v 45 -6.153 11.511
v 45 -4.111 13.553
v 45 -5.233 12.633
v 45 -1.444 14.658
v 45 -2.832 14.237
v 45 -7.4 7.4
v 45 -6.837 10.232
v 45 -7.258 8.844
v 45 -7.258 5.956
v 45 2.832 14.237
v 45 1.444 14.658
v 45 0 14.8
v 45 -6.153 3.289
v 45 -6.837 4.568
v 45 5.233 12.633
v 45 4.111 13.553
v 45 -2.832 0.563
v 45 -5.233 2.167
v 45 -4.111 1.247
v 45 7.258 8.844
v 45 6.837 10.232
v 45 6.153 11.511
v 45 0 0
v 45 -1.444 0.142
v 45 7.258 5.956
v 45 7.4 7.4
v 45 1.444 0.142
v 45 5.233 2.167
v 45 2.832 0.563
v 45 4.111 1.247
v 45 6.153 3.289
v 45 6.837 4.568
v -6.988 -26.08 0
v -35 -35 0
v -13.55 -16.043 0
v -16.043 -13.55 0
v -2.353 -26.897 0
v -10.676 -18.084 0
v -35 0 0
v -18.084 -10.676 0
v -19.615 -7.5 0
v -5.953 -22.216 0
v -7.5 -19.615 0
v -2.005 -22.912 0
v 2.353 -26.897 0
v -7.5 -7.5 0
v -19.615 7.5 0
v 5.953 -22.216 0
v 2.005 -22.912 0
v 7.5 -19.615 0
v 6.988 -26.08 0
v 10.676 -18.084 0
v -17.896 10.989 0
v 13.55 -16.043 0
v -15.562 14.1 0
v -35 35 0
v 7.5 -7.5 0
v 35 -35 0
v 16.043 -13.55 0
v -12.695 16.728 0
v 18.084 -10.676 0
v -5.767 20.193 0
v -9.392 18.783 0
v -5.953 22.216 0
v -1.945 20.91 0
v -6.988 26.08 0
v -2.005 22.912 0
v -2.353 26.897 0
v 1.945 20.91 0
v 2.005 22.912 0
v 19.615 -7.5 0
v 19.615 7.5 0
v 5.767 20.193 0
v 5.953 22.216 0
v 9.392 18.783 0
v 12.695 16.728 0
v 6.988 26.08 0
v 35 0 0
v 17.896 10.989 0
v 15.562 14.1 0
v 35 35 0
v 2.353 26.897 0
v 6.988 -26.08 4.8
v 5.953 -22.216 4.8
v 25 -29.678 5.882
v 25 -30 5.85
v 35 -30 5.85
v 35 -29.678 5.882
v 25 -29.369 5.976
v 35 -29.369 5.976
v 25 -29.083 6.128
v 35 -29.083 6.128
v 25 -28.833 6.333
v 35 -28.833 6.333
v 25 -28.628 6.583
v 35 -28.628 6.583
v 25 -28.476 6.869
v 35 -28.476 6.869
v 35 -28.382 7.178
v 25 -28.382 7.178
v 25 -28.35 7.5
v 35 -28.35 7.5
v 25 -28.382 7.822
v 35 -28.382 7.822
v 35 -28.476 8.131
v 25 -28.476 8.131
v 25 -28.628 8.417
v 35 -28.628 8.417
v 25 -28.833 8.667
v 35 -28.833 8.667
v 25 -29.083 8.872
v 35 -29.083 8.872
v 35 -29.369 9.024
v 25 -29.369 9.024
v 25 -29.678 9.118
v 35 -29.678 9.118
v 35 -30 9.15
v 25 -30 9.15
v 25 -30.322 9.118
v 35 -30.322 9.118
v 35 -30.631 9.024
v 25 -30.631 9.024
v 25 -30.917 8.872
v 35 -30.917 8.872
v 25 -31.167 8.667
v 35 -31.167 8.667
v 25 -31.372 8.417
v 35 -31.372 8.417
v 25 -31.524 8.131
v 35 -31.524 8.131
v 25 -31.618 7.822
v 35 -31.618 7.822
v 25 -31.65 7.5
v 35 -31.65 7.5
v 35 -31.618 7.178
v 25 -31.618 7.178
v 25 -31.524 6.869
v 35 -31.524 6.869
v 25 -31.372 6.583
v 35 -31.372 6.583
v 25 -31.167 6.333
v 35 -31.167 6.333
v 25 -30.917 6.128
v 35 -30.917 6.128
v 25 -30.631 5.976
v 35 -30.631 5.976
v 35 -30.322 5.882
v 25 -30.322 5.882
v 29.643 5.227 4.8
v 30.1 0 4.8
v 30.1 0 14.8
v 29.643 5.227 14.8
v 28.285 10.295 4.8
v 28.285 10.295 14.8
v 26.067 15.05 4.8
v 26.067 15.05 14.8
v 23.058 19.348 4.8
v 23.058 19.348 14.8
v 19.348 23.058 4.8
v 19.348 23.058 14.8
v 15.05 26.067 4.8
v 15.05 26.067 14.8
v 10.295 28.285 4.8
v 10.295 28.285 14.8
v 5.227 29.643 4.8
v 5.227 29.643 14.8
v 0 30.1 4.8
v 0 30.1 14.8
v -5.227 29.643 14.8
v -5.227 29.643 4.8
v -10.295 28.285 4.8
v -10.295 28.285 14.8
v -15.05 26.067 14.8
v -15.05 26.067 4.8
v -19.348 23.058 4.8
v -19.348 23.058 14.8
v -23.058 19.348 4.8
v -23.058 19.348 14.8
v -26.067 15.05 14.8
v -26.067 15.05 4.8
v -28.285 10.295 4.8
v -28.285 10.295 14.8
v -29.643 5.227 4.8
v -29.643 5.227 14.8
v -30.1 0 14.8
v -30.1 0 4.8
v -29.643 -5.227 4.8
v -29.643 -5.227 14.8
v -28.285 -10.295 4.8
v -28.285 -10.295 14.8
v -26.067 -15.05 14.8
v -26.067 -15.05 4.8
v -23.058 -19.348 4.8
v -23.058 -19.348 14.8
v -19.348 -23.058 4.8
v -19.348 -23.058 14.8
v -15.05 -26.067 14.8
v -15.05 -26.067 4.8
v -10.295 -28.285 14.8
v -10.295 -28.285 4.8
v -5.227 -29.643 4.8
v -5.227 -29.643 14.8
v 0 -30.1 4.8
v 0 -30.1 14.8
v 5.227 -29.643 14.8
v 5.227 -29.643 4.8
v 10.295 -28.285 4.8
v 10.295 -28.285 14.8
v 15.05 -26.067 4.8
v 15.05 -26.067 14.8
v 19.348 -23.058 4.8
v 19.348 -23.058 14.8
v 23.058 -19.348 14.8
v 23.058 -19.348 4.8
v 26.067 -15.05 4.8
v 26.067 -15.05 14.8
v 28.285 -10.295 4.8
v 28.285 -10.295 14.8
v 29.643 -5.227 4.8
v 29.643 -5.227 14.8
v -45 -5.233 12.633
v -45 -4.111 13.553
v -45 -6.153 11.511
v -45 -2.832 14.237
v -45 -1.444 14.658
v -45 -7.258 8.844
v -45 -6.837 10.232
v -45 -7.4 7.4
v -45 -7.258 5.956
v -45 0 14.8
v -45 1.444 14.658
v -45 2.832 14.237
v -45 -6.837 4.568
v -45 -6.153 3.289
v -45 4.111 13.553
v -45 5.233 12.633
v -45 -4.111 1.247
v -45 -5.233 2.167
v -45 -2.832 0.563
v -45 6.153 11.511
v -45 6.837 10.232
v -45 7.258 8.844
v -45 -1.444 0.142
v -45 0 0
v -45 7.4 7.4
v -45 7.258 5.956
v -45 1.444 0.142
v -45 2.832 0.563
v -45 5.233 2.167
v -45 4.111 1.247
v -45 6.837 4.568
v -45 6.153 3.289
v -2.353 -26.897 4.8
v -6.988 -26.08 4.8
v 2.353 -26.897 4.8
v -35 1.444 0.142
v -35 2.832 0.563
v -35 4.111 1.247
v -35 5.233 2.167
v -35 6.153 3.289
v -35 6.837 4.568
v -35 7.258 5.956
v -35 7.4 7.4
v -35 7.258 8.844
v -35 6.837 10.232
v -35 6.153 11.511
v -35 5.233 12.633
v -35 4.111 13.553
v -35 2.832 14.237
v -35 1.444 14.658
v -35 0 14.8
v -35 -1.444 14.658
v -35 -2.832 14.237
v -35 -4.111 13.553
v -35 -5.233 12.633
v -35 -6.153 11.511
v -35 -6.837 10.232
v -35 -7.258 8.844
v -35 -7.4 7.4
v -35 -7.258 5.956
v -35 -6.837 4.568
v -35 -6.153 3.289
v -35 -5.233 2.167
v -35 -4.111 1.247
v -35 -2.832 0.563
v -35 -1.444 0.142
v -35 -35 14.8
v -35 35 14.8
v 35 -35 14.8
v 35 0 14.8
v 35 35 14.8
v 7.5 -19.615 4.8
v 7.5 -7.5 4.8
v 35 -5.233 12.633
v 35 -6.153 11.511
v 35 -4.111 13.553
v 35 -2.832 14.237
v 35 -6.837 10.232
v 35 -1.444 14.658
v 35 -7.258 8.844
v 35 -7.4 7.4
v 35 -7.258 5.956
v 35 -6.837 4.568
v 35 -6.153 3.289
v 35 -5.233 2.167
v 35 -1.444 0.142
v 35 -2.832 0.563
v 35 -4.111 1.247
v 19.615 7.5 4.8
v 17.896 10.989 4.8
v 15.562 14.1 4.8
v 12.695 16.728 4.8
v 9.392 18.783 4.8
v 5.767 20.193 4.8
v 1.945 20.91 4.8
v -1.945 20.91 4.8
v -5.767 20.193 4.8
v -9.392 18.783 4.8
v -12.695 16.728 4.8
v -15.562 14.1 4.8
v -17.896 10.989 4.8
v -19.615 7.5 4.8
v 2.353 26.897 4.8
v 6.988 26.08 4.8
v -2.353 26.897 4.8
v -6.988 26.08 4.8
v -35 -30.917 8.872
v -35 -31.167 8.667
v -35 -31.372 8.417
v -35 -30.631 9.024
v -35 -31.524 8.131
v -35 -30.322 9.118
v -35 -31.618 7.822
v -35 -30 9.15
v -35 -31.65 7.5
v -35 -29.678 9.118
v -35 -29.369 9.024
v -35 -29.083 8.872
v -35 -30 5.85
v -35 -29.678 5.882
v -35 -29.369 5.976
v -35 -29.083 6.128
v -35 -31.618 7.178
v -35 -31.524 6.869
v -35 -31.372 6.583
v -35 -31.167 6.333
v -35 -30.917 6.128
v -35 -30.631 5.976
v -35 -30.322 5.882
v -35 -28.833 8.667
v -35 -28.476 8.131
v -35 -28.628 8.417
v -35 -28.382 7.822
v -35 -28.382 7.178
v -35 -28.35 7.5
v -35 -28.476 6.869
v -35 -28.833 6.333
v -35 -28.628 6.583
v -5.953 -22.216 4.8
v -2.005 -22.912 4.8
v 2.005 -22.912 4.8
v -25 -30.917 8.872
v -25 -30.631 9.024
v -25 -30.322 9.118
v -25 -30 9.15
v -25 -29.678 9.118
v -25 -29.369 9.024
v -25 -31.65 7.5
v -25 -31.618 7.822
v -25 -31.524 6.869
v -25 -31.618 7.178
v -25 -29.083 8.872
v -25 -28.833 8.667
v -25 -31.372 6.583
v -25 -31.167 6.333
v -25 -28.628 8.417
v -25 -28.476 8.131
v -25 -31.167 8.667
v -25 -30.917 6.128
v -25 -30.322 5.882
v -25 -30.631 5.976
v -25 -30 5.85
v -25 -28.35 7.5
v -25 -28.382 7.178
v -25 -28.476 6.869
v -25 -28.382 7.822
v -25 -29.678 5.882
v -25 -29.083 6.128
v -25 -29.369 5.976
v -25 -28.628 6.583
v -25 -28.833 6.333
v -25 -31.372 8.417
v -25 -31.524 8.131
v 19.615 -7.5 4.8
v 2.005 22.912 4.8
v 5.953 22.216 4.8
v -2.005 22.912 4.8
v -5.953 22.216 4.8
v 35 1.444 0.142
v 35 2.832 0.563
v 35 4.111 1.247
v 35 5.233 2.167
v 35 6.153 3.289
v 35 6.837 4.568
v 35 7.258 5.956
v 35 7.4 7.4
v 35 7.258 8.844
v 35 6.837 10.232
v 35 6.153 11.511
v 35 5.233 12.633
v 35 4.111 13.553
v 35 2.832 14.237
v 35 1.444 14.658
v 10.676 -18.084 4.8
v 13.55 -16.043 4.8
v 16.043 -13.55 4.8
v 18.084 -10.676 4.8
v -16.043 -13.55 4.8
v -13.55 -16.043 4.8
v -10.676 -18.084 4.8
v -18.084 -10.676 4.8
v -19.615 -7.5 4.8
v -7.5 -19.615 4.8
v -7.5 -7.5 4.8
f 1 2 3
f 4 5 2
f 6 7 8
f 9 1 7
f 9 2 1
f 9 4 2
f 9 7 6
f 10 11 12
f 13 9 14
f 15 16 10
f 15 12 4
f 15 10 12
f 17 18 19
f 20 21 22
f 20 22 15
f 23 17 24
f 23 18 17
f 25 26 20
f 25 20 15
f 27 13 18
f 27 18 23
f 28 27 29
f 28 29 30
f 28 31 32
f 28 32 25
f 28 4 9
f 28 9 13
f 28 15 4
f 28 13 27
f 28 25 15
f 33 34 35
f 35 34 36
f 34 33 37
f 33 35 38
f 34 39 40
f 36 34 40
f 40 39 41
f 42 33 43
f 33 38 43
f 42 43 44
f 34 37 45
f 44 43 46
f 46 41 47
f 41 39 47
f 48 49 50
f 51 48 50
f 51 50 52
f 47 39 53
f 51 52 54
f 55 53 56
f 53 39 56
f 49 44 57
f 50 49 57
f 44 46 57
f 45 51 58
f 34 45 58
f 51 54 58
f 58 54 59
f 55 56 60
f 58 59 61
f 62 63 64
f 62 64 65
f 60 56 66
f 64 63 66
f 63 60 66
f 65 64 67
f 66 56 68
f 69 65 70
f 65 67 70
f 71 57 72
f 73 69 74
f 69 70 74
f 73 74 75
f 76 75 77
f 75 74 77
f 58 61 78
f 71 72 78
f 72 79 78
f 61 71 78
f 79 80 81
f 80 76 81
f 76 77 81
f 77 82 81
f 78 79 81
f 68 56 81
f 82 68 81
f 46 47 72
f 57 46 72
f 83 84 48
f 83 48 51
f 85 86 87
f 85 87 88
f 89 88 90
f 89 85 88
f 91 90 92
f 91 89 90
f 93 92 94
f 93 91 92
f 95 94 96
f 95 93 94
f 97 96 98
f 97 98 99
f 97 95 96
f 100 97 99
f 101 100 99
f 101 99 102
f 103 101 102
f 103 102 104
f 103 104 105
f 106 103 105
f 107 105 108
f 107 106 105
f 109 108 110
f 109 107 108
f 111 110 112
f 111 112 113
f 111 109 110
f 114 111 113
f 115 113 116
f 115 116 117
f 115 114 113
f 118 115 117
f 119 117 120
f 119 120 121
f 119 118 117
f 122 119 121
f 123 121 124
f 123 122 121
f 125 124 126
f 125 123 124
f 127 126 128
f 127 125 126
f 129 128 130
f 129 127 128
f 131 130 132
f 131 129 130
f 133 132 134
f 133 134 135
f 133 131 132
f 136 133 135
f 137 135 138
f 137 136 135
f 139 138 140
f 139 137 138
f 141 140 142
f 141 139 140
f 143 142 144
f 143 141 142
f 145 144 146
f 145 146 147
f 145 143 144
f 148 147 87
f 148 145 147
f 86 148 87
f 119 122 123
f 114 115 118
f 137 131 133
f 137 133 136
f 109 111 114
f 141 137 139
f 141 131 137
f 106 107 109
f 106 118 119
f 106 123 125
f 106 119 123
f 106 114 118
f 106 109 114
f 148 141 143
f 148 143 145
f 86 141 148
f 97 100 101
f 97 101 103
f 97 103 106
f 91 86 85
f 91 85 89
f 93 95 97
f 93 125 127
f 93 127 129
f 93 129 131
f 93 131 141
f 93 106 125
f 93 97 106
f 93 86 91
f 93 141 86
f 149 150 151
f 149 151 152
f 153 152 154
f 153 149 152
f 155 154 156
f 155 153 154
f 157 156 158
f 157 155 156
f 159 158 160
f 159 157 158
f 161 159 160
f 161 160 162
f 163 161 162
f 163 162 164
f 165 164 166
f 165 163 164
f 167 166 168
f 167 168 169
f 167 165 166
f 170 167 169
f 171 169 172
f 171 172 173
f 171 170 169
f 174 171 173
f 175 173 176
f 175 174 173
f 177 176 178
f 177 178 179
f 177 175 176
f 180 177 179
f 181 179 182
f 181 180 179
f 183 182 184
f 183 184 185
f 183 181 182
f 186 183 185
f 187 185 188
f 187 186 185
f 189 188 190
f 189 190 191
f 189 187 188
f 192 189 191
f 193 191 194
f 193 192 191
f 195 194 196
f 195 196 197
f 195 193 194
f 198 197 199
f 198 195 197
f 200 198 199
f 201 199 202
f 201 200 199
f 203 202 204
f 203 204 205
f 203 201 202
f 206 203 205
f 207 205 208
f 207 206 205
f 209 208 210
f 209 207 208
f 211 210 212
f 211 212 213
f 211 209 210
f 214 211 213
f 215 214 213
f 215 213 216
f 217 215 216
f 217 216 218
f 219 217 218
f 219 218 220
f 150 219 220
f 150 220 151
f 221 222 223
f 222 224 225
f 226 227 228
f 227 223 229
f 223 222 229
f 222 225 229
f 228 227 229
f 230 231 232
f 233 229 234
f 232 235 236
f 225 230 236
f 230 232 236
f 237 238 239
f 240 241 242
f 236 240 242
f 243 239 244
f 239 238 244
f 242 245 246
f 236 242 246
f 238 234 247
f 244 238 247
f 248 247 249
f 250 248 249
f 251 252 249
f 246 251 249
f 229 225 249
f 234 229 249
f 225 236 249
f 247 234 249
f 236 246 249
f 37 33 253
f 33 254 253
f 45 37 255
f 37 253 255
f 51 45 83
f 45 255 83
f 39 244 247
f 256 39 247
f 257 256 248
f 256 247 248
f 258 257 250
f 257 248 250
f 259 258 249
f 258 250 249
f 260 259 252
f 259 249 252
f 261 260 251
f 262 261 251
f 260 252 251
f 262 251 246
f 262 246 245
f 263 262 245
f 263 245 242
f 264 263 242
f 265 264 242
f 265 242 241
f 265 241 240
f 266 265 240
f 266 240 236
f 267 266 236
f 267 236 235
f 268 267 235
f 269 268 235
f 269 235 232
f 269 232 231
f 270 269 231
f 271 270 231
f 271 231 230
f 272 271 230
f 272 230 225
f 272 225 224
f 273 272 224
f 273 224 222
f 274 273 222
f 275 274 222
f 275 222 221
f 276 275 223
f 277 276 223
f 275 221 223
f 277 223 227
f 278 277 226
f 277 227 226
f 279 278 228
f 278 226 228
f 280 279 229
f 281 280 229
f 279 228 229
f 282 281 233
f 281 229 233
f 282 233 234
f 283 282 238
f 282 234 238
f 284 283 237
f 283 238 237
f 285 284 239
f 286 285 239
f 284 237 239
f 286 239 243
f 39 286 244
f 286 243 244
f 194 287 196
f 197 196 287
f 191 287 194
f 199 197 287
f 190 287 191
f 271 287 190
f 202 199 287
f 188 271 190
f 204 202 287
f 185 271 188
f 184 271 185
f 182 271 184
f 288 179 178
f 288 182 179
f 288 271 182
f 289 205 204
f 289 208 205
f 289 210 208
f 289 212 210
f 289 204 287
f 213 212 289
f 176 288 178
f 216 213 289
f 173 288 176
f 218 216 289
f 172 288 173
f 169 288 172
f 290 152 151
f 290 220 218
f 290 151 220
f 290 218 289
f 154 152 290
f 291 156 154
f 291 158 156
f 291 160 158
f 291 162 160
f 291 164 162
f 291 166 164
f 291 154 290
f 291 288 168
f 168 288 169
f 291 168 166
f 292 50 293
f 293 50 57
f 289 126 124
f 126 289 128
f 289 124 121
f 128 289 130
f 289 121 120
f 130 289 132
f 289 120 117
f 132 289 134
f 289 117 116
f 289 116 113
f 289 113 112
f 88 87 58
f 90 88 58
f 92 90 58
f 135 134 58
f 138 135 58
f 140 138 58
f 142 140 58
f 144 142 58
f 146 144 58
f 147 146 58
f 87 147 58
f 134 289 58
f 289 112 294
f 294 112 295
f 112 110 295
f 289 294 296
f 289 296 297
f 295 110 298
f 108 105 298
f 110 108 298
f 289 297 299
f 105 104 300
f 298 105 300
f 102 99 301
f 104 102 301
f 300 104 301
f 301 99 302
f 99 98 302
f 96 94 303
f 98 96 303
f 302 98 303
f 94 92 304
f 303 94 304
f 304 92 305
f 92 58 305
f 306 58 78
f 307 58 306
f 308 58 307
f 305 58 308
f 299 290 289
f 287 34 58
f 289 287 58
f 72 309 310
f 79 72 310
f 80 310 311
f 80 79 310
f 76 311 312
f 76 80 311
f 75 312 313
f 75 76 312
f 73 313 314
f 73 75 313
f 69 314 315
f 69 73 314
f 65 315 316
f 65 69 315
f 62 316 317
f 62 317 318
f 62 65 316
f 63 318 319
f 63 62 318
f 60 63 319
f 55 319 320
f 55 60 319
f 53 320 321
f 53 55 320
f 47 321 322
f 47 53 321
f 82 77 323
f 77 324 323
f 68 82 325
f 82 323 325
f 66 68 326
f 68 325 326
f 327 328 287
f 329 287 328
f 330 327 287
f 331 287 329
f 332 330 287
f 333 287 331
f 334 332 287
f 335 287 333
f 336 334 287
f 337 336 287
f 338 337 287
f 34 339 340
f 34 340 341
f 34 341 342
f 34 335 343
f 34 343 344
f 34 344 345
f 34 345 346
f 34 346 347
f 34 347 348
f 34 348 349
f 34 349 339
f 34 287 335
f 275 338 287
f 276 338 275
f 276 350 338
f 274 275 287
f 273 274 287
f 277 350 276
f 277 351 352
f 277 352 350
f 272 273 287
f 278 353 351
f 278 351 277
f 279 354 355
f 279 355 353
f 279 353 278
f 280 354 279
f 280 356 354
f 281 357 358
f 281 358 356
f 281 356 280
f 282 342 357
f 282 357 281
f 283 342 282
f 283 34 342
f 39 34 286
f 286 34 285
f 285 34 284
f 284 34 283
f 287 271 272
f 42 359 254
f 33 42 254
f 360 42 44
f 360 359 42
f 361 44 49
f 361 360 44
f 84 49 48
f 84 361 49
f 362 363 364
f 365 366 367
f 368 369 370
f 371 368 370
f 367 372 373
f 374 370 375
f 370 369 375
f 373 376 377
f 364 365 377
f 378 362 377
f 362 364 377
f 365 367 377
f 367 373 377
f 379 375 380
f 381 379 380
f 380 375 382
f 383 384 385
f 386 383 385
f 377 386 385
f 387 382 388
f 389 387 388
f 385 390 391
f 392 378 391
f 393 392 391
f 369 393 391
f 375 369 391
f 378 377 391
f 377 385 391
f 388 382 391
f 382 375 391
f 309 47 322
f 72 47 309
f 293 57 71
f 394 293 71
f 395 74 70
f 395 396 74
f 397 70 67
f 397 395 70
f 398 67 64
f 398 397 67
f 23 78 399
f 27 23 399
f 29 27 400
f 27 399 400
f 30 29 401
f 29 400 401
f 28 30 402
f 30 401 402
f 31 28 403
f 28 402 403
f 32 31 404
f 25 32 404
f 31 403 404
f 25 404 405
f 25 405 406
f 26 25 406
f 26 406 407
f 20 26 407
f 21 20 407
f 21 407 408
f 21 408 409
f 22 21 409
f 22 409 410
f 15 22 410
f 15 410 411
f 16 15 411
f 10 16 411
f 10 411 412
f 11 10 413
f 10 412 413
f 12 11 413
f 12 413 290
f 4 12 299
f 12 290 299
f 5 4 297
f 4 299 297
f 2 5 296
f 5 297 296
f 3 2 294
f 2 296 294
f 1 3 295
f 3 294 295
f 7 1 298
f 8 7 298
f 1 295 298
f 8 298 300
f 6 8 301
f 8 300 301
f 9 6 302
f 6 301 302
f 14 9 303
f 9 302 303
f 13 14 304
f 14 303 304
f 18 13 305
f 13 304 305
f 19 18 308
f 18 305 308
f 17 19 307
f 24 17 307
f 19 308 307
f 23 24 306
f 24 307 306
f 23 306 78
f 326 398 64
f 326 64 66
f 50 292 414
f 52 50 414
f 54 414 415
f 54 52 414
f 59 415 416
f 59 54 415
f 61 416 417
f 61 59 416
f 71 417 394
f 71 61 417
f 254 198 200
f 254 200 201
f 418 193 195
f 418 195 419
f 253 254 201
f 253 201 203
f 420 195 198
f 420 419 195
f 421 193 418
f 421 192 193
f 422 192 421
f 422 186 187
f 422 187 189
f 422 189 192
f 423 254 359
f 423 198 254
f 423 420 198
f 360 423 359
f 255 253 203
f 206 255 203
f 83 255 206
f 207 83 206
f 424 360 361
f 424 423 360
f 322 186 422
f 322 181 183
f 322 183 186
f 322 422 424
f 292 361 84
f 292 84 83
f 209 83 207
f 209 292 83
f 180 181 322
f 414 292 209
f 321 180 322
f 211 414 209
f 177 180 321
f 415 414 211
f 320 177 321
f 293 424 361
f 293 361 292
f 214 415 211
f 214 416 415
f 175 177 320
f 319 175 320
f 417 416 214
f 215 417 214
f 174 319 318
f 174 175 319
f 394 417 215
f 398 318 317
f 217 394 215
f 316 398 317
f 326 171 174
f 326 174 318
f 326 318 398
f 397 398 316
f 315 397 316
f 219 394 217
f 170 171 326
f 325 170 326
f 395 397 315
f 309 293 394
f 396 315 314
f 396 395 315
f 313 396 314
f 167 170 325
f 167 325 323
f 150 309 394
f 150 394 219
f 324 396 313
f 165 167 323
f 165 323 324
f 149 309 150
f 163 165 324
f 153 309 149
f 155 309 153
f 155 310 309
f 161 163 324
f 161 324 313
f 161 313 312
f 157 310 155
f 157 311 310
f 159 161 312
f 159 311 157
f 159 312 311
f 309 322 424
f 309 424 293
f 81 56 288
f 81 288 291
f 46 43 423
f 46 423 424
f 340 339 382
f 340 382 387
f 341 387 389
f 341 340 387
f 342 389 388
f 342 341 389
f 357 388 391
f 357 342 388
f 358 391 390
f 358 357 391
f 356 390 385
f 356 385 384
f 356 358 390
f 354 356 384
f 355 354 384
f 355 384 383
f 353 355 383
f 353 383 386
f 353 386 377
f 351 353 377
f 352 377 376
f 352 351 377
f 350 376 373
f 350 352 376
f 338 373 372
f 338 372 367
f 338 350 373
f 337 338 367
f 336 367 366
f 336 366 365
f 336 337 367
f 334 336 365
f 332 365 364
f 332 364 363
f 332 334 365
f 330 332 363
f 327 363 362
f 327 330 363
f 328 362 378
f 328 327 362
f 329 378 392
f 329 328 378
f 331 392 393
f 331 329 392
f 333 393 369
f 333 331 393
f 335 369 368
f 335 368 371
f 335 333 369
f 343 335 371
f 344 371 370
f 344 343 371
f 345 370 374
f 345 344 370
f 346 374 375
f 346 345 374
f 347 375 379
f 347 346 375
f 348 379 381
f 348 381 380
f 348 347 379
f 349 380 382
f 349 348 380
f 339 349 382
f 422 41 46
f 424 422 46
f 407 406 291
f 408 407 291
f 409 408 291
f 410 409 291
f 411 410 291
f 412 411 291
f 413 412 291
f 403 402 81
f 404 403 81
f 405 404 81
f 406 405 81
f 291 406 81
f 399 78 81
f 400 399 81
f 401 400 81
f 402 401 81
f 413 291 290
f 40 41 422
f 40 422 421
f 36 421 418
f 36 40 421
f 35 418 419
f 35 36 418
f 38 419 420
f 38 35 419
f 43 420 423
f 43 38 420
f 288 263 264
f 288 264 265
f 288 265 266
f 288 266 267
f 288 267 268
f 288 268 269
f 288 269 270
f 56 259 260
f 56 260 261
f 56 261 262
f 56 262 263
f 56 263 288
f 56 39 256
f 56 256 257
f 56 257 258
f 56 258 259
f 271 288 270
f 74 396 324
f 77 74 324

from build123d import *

# Parameters (mm, degrees)
BOX001_W               = 50
BOX001_H               = 15
BOX001_DEPTH           = 4.8
CYLINDER006_R          = 7.4
CYLINDER006_DEPTH      = 10
BOX002_W               = 15
BOX002_H               = 21.5
BOX002_DEPTH           = 4.8
CYLINDER005_R          = 7.4
CYLINDER005_DEPTH      = 10
CYLINDER002_W          = 23
CYLINDER002_H          = 4.8
CYLINDER002_ANGLE      = 30
CYLINDER001_W          = 27
CYLINDER001_H          = 4.8
CYLINDER001_ANGLE      = 30
CUT001_PLACEMENT_ANGLE = 105
CYLINDER010_R          = 1.65
CYLINDER010_DEPTH      = 10
CYLINDER012_R          = 1.65
CYLINDER012_DEPTH      = 10
CYLINDER013_R          = 21
CYLINDER013_DEPTH      = 4.8
CYLINDER004_W          = 23
CYLINDER004_H          = 4.8
CYLINDER004_ANGLE      = 30
CYLINDER003_W          = 27
CYLINDER003_H          = 4.8
CYLINDER003_ANGLE      = 30
CUT002_PLACEMENT_ANGLE = 75
CYLINDER_R             = 30.1
CYLINDER_DEPTH         = 10
BOX_W                  = 70
BOX_H                  = 70
BOX_DEPTH              = 14.8


with BuildPart() as w_rfel001:
    # Box001 → Box001 (new body)
    with BuildSketch(Plane(origin=(-25, -7.5, 0), x_dir=(1, 0, 0), z_dir=(0, 0, 1))):
        with Locations((25, 7.5)):
            Rectangle(BOX001_W, BOX001_H)
    extrude(amount=BOX001_DEPTH)


with BuildPart() as cylinder006:
    # Cylinder006 → Cylinder006 (new body)
    with BuildSketch(Plane(origin=(35, 0, 7.4), x_dir=(0, 0, -1), z_dir=(1, 0, 0))):
        Circle(CYLINDER006_R)
    extrude(amount=CYLINDER006_DEPTH)


with BuildPart() as w_rfel002:
    # Box002 → Box002 (new body)
    with BuildSketch(Plane(origin=(-7.5, -21.5, 0), x_dir=(1, 0, 0), z_dir=(0, 0, 1))):
        with Locations((7.5, 10.75)):
            Rectangle(BOX002_W, BOX002_H)
    extrude(amount=BOX002_DEPTH)


with BuildPart() as fusion001:
    # Cylinder005 → Cylinder005 (new body)
    with BuildSketch(Plane(origin=(-45, 0, 7.4), x_dir=(0, 0, -1), z_dir=(1, 0, 0))):
        Circle(CYLINDER005_R)
    extrude(amount=CYLINDER005_DEPTH)

    # Fusion001: union Würfel001, Cylinder006, Würfel002
    add(w_rfel001.part)
    add(cylinder006.part)
    add(w_rfel002.part)


with BuildPart() as zylinder002:
    # Cylinder002 → Cylinder002 (revolve)
    with BuildSketch(Plane.XZ):
        with Locations((11.5, 2.4)):
            Rectangle(CYLINDER002_W, CYLINDER002_H)
    revolve(axis=Axis((0, 0, 0), (0, 0, 1)), revolution_arc=CYLINDER002_ANGLE)


with BuildPart() as cut004:
    # Cylinder001 → Cylinder001 (revolve)
    with BuildSketch(Plane.XZ):
        with Locations((13.5, 2.4)):
            Rectangle(CYLINDER001_W, CYLINDER001_H)
    revolve(axis=Axis((0, 0, 0), (0, 0, 1)), revolution_arc=CYLINDER001_ANGLE)

    # Cut001: cut Zylinder002
    add(zylinder002.part, mode=Mode.SUBTRACT)


with BuildPart() as cut004_1:
    # Cut001 placement: moved
    add(cut004.part.rotate(Axis((0, 0, 0), (0, 0, -1)), CUT001_PLACEMENT_ANGLE))


with BuildPart() as cylinder010:
    # Cylinder010 → Cylinder010 (new body)
    with BuildSketch(Plane(origin=(-35, -30, 7.5), x_dir=(0, 0, -1), z_dir=(1, 0, 0))):
        Circle(CYLINDER010_R)
    extrude(amount=CYLINDER010_DEPTH)


with BuildPart() as cylinder012:
    # Cylinder012 → Cylinder012 (new body)
    with BuildSketch(Plane(origin=(25, -30, 7.5), x_dir=(0, 0, -1), z_dir=(1, 0, 0))):
        Circle(CYLINDER012_R)
    extrude(amount=CYLINDER012_DEPTH)


with BuildPart() as cylinder013:
    # Cylinder013 → Cylinder013 (new body)
    with BuildSketch(Plane.XY):
        Circle(CYLINDER013_R)
    extrude(amount=CYLINDER013_DEPTH)


with BuildPart() as zylinder004:
    # Cylinder004 → Cylinder004 (revolve)
    with BuildSketch(Plane.XZ):
        with Locations((11.5, 2.4)):
            Rectangle(CYLINDER004_W, CYLINDER004_H)
    revolve(axis=Axis((0, 0, 0), (0, 0, 1)), revolution_arc=CYLINDER004_ANGLE)


with BuildPart() as bohrschlitze:
    # Cylinder003 → Cylinder003 (revolve)
    with BuildSketch(Plane.XZ):
        with Locations((13.5, 2.4)):
            Rectangle(CYLINDER003_W, CYLINDER003_H)
    revolve(axis=Axis((0, 0, 0), (0, 0, 1)), revolution_arc=CYLINDER003_ANGLE)

    # Cut002: cut Zylinder004
    add(zylinder004.part, mode=Mode.SUBTRACT)


with BuildPart() as bohrschlitze_1:
    # Cut002 placement: moved
    add(bohrschlitze.part.rotate(Axis((0, 0, 0), (0, 0, 1)), CUT002_PLACEMENT_ANGLE))

    # Fusion: union Cut004, Cylinder010, Cylinder012, Cylinder013
    add(cut004_1.part)
    add(cylinder010.part)
    add(cylinder012.part)
    add(cylinder013.part)


with BuildPart() as zylinder:
    # Cylinder → Cylinder (new body)
    with BuildSketch(Plane.XY.offset(4.8)):
        Circle(CYLINDER_R)
    extrude(amount=CYLINDER_DEPTH)


with BuildPart() as fusion002:
    # Box → Box (new body)
    with BuildSketch(Plane(origin=(-35, -35, 0), x_dir=(1, 0, 0), z_dir=(0, 0, 1))):
        with Locations((35, 35)):
            Rectangle(BOX_W, BOX_H)
    extrude(amount=BOX_DEPTH)

    # Cut: cut Zylinder
    add(zylinder.part, mode=Mode.SUBTRACT)

    # Cut003: cut Bohrschlitze
    add(bohrschlitze_1.part, mode=Mode.SUBTRACT)

    # Fusion002: union Fusion001
    add(fusion001.part)


solid = fusion002.part
